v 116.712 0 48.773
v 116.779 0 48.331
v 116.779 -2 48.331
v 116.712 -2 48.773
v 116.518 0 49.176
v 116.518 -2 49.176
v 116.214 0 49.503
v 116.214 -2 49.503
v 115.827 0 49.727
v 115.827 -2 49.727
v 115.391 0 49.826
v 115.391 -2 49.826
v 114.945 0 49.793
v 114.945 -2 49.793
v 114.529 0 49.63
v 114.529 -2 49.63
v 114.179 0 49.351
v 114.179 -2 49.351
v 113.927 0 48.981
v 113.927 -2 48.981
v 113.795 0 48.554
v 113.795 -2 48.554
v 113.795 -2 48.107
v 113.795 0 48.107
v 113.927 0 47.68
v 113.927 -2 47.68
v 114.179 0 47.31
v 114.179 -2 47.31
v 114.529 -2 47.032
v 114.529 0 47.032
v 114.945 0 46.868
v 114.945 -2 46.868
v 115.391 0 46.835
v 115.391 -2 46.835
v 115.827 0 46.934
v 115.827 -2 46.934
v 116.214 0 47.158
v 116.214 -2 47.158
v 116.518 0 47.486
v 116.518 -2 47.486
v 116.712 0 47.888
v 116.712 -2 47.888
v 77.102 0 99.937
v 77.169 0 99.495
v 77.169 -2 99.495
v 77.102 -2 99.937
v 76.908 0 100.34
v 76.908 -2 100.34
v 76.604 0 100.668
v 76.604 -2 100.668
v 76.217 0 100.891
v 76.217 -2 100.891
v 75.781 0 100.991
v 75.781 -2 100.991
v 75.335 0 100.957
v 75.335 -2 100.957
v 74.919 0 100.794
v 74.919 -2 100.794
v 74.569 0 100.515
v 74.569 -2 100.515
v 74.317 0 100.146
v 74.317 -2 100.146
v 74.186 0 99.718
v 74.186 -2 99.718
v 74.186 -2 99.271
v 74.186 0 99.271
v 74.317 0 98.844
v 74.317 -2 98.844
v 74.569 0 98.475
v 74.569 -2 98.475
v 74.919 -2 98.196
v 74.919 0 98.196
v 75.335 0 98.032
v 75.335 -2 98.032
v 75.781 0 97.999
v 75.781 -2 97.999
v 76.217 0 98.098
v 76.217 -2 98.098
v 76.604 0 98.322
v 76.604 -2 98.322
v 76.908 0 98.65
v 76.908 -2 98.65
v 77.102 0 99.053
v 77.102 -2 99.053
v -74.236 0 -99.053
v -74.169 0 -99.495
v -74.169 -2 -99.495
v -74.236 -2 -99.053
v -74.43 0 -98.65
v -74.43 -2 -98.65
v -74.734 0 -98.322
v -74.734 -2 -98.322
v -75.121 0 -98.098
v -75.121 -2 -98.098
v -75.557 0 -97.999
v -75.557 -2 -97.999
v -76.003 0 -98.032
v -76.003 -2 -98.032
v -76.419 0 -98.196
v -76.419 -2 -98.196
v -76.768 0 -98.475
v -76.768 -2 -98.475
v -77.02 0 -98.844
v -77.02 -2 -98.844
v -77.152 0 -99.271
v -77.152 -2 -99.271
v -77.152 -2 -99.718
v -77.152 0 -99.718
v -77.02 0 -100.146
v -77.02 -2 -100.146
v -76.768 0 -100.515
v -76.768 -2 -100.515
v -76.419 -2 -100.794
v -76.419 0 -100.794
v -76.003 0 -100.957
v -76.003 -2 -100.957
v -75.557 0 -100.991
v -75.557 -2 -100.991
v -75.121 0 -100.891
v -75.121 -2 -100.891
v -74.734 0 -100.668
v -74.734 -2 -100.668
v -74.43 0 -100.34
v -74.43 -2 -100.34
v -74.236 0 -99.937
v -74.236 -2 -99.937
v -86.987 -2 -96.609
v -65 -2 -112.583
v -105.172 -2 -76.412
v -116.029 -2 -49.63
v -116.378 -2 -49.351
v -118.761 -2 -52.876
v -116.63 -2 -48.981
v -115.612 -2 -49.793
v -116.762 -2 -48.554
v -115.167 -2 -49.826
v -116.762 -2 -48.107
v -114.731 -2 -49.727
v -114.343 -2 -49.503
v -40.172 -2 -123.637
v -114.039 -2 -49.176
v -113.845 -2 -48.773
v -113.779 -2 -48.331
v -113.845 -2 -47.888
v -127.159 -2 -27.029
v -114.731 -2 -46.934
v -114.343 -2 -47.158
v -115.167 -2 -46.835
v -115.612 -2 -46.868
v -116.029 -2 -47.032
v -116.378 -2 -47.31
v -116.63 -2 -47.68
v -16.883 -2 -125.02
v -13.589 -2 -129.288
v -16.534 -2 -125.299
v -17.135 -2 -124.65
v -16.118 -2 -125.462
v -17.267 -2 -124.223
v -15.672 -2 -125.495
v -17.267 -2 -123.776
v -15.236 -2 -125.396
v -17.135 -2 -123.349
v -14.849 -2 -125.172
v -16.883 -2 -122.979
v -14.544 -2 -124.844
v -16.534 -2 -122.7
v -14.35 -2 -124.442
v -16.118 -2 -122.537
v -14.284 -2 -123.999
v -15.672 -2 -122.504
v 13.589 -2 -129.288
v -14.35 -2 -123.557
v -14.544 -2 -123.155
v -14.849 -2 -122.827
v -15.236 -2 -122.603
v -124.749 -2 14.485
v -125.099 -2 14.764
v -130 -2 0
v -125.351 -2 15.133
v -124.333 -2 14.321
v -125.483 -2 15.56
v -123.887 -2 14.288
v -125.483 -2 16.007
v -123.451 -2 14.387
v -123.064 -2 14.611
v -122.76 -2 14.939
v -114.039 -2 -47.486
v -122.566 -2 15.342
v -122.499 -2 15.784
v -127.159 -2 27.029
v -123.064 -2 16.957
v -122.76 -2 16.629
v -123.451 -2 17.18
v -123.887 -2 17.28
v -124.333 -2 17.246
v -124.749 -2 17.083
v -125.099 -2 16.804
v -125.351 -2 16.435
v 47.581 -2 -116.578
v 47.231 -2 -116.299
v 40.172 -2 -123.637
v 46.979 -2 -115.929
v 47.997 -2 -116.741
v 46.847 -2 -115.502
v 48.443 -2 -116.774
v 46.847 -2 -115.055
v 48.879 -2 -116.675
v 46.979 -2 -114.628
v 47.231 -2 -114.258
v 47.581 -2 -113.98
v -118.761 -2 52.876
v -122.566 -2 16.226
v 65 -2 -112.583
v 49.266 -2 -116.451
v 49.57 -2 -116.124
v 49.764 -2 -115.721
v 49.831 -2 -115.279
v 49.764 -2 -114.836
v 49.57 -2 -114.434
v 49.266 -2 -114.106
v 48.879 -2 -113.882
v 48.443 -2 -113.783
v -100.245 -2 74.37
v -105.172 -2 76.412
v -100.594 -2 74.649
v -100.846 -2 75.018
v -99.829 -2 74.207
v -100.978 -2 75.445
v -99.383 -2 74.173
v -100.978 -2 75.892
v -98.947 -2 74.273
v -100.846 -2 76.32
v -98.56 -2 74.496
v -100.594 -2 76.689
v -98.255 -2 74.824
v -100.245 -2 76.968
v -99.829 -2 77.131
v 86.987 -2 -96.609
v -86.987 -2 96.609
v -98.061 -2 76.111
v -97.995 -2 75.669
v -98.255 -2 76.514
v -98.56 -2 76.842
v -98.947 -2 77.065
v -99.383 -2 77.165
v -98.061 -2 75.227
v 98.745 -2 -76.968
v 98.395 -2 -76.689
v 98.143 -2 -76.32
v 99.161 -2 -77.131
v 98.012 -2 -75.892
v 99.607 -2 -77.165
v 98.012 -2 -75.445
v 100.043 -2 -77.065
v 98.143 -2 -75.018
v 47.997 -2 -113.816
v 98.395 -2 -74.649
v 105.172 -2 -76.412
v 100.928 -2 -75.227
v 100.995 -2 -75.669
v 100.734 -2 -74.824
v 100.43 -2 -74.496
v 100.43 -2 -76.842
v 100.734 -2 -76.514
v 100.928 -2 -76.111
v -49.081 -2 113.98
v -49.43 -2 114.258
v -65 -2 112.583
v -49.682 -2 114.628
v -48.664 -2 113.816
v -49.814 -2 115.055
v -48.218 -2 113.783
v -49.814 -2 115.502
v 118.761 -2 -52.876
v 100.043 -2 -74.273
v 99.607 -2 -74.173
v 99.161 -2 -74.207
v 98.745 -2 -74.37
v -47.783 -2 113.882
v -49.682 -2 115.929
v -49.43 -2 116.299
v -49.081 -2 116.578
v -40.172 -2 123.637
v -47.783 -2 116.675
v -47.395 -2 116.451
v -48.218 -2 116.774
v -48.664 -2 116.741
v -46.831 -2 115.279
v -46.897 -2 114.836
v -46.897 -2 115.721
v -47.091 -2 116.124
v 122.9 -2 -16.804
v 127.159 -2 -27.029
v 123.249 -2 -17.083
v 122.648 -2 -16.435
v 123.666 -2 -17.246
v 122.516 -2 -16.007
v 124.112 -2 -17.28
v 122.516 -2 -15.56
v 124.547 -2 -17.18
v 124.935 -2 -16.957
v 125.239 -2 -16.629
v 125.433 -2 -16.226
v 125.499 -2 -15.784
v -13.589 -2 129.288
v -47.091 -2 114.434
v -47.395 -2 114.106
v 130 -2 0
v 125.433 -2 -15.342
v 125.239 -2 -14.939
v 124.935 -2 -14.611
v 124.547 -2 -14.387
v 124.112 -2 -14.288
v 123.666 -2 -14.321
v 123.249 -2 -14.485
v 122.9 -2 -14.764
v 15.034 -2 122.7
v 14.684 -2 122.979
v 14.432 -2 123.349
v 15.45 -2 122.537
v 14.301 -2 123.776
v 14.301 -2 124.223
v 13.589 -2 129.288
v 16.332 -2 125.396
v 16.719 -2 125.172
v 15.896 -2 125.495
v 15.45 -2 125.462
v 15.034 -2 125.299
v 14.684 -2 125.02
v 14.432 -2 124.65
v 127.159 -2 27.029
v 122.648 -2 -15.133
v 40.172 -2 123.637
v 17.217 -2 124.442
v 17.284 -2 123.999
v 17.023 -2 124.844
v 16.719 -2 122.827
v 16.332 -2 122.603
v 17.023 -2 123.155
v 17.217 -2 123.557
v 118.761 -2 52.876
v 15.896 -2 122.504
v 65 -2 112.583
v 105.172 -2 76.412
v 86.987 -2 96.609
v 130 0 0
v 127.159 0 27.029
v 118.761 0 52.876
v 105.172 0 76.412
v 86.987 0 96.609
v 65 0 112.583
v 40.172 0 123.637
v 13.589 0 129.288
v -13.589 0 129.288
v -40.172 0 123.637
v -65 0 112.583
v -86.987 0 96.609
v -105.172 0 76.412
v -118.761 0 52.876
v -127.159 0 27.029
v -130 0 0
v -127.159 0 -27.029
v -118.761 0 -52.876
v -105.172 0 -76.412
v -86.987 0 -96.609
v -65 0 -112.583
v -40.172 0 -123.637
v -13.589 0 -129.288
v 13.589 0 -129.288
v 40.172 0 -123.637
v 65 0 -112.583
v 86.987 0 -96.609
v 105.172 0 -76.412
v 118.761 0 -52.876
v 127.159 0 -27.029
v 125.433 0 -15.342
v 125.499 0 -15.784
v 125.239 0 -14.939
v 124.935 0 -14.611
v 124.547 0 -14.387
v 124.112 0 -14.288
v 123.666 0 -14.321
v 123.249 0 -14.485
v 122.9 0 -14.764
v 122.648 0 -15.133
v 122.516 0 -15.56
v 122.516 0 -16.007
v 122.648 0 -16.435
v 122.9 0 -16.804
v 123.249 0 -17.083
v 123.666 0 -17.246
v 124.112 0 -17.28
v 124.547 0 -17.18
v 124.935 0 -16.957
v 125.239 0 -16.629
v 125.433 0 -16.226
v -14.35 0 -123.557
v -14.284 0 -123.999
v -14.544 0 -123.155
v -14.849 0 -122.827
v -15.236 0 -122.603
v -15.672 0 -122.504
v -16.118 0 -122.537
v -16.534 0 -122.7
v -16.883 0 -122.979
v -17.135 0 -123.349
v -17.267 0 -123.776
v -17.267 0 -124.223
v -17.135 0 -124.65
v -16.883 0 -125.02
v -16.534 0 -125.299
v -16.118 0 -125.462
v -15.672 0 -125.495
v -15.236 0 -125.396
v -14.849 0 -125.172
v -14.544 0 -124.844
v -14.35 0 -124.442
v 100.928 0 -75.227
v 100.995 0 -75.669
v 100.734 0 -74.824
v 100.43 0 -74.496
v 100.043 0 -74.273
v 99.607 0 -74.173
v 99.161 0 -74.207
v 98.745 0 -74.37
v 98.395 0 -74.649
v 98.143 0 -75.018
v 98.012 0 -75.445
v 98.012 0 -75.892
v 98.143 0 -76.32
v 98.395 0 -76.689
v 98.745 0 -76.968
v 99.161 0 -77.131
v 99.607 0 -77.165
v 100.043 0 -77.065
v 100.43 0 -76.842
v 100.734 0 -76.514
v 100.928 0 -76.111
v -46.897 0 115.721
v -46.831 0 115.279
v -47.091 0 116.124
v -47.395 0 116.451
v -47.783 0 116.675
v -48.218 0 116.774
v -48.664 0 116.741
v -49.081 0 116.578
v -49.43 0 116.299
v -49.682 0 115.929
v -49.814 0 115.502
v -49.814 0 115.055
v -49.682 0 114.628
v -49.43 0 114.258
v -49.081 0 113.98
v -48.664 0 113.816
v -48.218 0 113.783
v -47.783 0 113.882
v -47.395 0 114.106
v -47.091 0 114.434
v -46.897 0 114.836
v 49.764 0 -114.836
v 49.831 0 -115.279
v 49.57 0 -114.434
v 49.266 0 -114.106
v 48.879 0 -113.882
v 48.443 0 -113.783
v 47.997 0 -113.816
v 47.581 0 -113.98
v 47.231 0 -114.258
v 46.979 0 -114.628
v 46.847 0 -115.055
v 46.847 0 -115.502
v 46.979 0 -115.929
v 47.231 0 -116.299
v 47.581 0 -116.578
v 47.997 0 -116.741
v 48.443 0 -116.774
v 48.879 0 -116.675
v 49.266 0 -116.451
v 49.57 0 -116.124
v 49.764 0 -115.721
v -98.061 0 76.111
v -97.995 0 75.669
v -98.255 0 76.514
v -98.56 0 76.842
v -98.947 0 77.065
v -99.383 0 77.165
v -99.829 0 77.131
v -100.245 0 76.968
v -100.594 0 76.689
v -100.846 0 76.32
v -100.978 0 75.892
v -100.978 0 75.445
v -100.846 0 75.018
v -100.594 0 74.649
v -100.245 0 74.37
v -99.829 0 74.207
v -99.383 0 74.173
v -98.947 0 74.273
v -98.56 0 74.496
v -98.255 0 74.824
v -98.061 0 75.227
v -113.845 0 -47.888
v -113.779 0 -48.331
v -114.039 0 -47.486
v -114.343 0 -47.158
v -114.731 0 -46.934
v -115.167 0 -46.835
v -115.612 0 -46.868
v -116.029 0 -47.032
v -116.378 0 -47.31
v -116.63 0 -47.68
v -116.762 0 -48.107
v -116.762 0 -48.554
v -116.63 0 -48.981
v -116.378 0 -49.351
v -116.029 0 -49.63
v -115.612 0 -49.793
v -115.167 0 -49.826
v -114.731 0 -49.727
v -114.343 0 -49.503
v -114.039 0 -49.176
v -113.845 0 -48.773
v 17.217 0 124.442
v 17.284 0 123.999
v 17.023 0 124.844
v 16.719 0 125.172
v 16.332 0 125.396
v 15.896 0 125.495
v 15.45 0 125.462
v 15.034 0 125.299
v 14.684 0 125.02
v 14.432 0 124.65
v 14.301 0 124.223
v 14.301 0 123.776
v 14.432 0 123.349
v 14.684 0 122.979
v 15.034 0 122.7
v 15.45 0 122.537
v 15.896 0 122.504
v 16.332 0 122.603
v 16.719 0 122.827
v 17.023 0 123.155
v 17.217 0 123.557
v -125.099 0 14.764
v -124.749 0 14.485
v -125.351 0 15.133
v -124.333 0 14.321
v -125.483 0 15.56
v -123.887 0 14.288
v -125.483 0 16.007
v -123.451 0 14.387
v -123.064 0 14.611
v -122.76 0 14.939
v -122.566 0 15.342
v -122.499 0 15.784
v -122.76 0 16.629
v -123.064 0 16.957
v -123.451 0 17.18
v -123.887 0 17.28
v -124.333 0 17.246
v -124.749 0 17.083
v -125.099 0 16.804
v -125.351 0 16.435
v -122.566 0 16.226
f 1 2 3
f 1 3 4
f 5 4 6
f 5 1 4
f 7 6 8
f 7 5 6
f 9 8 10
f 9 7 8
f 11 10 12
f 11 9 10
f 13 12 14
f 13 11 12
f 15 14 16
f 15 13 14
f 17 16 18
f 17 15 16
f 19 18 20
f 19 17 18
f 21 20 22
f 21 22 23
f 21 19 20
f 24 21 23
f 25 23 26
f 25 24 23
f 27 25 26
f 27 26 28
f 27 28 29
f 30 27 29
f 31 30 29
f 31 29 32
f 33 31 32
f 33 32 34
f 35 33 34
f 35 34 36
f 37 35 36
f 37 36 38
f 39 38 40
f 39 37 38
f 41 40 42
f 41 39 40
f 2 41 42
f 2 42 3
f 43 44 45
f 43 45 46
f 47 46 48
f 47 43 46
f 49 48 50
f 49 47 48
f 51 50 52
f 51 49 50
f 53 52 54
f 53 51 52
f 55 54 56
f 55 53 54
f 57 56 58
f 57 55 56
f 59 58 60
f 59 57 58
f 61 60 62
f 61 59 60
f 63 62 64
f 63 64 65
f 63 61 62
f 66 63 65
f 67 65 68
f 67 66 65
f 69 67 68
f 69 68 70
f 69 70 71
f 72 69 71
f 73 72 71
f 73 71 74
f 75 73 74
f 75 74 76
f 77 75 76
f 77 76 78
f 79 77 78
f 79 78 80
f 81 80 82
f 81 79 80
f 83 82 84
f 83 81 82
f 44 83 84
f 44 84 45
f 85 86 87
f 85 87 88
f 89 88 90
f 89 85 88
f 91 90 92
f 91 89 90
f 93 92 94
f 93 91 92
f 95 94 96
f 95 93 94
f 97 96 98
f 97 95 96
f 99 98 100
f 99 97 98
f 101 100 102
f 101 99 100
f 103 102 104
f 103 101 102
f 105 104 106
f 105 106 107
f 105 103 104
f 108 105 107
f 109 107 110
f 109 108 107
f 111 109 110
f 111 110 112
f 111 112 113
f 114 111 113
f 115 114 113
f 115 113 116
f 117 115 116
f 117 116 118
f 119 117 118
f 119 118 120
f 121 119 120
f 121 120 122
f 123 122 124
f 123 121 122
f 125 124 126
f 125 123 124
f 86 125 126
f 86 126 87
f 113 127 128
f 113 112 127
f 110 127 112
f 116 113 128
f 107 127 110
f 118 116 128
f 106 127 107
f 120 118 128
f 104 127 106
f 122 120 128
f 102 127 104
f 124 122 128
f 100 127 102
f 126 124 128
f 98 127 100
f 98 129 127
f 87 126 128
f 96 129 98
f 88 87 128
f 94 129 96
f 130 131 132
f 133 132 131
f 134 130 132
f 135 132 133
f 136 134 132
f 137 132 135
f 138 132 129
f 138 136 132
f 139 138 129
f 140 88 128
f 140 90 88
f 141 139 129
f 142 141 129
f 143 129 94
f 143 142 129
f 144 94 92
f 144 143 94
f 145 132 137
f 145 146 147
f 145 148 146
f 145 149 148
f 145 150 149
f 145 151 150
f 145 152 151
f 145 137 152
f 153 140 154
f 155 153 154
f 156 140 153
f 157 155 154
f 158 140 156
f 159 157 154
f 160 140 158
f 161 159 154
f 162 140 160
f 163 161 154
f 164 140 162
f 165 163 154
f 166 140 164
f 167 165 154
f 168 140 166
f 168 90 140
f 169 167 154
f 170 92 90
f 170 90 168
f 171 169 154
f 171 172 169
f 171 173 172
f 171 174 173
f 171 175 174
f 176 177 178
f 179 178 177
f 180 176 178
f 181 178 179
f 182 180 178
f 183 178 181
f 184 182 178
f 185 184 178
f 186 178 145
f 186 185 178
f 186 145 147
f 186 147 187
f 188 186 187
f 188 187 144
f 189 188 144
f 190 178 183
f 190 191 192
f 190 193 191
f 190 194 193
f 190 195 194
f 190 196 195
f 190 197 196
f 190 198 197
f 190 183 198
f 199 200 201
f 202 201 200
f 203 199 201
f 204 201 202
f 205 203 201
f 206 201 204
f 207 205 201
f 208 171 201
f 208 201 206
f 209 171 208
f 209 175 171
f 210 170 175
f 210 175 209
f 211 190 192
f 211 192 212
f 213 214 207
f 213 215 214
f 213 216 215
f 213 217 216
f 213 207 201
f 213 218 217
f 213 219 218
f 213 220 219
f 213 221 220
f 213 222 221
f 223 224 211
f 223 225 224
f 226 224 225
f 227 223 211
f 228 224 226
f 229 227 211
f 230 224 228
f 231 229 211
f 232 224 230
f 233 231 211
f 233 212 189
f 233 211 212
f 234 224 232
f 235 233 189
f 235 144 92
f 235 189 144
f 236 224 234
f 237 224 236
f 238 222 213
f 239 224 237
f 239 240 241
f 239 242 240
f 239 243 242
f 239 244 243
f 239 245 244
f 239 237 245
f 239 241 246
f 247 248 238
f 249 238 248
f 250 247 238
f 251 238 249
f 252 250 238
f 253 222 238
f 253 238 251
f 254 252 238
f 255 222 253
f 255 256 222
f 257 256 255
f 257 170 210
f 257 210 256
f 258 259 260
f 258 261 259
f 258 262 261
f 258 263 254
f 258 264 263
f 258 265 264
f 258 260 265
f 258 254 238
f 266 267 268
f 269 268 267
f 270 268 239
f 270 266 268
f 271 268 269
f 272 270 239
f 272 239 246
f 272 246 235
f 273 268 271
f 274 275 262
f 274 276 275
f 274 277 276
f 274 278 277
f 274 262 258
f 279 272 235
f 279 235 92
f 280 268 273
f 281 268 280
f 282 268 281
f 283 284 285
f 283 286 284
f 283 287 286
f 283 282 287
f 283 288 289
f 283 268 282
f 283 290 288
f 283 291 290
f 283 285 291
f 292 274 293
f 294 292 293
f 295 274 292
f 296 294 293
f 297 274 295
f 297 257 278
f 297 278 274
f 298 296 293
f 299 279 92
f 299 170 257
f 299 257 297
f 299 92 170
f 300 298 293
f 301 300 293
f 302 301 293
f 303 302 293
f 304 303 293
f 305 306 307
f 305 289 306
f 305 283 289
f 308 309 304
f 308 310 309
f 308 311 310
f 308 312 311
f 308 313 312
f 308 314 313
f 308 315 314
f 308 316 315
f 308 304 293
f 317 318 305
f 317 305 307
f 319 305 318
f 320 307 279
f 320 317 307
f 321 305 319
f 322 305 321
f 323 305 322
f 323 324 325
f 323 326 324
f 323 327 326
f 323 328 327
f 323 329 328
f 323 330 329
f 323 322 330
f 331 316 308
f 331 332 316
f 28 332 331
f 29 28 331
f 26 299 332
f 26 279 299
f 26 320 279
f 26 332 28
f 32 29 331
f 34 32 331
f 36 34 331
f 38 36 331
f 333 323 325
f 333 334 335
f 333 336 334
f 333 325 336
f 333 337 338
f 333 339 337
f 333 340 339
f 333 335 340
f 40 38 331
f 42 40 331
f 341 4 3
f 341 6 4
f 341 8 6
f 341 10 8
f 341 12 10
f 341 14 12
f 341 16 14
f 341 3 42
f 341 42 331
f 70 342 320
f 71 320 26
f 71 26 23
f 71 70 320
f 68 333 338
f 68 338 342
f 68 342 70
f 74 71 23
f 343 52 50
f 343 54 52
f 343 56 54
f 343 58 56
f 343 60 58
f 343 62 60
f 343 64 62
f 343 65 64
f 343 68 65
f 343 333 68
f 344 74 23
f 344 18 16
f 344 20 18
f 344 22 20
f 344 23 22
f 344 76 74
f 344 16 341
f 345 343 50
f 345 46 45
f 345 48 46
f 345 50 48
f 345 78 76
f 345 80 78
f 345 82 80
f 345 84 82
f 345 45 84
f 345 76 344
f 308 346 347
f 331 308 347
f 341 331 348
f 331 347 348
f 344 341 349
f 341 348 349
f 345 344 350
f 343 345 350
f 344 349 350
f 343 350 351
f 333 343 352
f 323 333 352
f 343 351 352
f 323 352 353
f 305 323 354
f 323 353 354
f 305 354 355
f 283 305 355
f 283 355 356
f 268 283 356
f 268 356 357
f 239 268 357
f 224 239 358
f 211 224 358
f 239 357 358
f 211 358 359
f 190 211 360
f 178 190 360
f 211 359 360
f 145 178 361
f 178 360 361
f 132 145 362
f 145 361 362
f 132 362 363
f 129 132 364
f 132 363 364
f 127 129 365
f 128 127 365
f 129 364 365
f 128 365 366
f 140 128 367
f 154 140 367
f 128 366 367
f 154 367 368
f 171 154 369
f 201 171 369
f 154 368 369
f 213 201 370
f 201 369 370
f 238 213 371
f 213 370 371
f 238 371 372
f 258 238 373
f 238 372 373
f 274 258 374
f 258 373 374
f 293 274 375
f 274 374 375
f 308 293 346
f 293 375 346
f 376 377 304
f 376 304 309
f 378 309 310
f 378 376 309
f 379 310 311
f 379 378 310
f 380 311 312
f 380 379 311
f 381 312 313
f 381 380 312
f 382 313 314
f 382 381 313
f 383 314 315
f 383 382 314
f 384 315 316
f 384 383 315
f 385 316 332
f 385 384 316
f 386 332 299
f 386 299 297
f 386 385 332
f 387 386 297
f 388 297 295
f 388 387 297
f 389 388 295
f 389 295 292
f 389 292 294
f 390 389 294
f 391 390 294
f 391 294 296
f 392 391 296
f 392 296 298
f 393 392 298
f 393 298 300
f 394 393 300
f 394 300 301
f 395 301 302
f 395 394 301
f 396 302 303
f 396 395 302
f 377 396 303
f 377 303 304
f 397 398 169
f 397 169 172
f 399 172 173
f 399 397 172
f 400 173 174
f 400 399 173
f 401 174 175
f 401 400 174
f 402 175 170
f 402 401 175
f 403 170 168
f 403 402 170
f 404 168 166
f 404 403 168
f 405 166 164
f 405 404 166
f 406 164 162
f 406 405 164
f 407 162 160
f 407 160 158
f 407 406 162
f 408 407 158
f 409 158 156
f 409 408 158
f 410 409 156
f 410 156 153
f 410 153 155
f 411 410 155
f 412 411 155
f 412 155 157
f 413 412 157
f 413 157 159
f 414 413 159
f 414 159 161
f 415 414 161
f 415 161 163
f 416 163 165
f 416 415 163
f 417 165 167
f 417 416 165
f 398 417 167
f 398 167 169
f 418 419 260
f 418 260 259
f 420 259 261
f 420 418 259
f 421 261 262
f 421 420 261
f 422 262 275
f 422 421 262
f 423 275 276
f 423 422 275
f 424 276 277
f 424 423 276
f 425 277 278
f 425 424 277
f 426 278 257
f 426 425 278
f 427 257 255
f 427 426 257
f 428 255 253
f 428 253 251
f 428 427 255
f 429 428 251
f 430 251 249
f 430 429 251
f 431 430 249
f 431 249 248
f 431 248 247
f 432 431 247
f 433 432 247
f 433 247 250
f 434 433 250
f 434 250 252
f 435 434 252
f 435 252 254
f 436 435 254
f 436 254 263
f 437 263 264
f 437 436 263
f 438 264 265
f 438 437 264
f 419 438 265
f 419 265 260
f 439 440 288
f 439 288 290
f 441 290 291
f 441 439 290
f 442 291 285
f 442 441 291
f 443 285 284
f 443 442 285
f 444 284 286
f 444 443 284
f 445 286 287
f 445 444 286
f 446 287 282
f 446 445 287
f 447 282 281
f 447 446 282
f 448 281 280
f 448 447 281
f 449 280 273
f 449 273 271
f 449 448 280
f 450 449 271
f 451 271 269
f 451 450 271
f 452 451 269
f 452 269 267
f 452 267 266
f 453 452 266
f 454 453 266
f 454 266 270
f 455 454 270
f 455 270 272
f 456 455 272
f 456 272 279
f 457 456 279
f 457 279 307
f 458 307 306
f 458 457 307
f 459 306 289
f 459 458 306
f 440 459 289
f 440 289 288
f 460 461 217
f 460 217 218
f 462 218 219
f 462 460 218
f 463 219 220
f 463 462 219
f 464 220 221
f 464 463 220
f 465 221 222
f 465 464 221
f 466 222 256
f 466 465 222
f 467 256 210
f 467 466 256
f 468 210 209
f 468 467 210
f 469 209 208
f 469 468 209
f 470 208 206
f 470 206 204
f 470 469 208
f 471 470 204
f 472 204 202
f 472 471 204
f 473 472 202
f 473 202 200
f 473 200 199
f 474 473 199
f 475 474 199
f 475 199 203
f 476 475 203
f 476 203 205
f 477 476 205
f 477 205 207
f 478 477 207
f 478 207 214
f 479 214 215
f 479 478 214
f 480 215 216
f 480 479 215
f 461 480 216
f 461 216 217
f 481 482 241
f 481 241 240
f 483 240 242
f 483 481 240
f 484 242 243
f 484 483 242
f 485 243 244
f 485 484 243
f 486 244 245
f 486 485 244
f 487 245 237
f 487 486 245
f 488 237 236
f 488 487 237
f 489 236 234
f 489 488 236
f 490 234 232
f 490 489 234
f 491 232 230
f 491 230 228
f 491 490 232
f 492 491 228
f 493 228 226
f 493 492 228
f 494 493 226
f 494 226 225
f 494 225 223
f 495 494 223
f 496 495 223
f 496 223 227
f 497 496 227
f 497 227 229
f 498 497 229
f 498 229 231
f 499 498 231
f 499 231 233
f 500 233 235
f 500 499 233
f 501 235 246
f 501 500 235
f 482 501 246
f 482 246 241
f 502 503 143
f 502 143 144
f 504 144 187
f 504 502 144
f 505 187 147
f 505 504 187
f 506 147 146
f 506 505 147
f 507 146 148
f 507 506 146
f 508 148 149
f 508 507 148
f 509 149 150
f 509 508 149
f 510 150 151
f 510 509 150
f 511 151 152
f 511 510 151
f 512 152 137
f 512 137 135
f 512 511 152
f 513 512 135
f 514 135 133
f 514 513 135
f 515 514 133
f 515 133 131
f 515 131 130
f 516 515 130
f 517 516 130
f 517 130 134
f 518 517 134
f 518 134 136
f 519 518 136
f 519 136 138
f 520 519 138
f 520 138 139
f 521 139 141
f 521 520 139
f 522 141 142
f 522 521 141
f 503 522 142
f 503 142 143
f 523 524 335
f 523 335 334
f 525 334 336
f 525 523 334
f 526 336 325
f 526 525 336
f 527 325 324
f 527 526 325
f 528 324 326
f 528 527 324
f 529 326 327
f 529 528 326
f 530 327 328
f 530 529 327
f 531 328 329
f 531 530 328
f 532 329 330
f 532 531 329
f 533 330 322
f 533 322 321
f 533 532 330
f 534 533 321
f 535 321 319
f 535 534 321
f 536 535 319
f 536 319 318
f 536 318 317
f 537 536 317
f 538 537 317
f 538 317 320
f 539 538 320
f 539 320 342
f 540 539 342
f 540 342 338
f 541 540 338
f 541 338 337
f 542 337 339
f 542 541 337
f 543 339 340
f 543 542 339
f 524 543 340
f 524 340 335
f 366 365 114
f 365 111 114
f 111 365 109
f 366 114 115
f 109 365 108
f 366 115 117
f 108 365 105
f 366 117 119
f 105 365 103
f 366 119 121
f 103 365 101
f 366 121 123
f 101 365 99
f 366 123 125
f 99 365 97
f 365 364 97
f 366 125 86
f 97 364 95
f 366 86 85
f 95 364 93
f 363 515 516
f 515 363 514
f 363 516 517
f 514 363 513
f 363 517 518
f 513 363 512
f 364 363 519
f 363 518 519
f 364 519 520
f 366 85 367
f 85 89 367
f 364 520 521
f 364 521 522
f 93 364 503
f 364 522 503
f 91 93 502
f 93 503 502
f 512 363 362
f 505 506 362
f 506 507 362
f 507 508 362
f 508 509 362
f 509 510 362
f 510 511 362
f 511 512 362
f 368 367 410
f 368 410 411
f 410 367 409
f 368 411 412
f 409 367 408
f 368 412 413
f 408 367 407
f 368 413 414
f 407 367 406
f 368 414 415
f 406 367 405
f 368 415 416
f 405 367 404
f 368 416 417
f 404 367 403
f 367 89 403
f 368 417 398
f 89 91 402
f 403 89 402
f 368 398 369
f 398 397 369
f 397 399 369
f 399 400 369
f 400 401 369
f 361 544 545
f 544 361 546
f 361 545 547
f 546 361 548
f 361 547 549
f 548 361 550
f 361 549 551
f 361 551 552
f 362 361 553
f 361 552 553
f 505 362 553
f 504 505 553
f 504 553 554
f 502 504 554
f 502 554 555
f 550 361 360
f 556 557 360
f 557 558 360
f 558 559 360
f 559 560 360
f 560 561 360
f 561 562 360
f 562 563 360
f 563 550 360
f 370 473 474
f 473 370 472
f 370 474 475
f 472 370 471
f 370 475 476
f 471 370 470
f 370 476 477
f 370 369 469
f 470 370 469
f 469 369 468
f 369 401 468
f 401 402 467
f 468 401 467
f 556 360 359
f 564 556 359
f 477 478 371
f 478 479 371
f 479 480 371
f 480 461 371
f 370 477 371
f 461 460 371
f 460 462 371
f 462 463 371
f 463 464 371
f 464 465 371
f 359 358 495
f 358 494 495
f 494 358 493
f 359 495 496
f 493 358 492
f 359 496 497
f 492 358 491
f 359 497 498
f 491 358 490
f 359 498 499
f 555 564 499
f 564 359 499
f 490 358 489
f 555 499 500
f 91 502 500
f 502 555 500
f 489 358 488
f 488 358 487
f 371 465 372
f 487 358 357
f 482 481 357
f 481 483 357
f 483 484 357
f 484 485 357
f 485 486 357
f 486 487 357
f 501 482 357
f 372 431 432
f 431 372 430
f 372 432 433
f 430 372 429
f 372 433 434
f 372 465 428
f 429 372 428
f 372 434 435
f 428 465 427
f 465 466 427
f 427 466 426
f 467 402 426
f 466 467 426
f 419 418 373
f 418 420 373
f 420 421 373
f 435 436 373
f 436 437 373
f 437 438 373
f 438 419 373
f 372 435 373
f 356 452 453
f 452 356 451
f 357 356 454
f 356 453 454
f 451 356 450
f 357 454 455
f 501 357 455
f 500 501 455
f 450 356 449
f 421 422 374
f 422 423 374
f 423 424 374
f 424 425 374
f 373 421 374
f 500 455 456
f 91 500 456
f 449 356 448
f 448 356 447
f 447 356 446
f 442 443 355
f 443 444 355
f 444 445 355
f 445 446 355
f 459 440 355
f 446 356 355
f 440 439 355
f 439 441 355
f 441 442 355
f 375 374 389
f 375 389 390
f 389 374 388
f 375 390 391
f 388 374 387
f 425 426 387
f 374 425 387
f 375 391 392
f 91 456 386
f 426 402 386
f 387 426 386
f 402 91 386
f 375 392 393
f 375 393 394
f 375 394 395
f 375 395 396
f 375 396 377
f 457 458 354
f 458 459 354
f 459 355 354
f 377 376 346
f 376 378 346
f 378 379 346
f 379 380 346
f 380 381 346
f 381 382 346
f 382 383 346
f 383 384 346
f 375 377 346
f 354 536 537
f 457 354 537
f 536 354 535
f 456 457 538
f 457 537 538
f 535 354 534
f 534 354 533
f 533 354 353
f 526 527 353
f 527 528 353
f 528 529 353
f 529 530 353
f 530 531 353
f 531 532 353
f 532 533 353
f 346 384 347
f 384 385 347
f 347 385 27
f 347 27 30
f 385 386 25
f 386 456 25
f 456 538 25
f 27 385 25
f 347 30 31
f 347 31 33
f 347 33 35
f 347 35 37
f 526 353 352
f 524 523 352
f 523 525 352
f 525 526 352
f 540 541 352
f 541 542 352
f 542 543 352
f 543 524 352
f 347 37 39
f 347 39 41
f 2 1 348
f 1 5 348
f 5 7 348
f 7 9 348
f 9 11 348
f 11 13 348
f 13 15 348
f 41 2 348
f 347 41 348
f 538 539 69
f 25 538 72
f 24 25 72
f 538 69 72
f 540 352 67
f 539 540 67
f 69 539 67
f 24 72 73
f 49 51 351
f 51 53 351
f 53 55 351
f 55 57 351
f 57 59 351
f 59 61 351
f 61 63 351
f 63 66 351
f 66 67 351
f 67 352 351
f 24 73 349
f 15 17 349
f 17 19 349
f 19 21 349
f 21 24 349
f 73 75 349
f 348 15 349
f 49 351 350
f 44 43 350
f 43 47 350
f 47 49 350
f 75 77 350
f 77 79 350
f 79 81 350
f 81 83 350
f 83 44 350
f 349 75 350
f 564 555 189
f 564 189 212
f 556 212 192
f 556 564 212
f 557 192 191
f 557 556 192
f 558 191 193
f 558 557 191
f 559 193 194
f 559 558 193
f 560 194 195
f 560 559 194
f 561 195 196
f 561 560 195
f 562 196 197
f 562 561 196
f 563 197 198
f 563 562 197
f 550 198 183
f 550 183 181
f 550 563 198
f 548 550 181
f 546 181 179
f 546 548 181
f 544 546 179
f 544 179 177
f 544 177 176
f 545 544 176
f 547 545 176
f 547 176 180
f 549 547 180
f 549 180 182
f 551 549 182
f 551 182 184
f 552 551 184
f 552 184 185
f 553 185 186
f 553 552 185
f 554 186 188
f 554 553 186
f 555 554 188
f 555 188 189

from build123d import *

# Parameters (mm, degrees)
F0_R     = 130
F0_R_2   = 1.5
F1_DEPTH = 2


with BuildPart() as f1:
    # F0 (on Front) → F1 (new body)
    with BuildSketch(Plane.XZ):
        Circle(F0_R)
        with Locations((-75.66891, -99.494804)):
            Circle(F0_R_2, mode=Mode.SUBTRACT)
        with Locations((-15.783797, -123.999483)):
            Circle(F0_R_2, mode=Mode.SUBTRACT)
        with Locations((-115.278601, -48.330573)):
            Circle(F0_R_2, mode=Mode.SUBTRACT)
        with Locations((48.330573, -115.278601)):
            Circle(F0_R_2, mode=Mode.SUBTRACT)
        with Locations((99.494804, -75.66891)):
            Circle(F0_R_2, mode=Mode.SUBTRACT)
        with Locations((123.999483, -15.783797)):
            Circle(F0_R_2, mode=Mode.SUBTRACT)
        with Locations((-123.999483, 15.783797)):
            Circle(F0_R_2, mode=Mode.SUBTRACT)
        with Locations((-99.494804, 75.66891)):
            Circle(F0_R_2, mode=Mode.SUBTRACT)
        with Locations((-48.330573, 115.278601)):
            Circle(F0_R_2, mode=Mode.SUBTRACT)
        with Locations((115.278601, 48.330573)):
            Circle(F0_R_2, mode=Mode.SUBTRACT)
        with Locations((15.783797, 123.999483)):
            Circle(F0_R_2, mode=Mode.SUBTRACT)
        with Locations((75.66891, 99.494804)):
            Circle(F0_R_2, mode=Mode.SUBTRACT)
    extrude(amount=F1_DEPTH)


solid = f1.part
